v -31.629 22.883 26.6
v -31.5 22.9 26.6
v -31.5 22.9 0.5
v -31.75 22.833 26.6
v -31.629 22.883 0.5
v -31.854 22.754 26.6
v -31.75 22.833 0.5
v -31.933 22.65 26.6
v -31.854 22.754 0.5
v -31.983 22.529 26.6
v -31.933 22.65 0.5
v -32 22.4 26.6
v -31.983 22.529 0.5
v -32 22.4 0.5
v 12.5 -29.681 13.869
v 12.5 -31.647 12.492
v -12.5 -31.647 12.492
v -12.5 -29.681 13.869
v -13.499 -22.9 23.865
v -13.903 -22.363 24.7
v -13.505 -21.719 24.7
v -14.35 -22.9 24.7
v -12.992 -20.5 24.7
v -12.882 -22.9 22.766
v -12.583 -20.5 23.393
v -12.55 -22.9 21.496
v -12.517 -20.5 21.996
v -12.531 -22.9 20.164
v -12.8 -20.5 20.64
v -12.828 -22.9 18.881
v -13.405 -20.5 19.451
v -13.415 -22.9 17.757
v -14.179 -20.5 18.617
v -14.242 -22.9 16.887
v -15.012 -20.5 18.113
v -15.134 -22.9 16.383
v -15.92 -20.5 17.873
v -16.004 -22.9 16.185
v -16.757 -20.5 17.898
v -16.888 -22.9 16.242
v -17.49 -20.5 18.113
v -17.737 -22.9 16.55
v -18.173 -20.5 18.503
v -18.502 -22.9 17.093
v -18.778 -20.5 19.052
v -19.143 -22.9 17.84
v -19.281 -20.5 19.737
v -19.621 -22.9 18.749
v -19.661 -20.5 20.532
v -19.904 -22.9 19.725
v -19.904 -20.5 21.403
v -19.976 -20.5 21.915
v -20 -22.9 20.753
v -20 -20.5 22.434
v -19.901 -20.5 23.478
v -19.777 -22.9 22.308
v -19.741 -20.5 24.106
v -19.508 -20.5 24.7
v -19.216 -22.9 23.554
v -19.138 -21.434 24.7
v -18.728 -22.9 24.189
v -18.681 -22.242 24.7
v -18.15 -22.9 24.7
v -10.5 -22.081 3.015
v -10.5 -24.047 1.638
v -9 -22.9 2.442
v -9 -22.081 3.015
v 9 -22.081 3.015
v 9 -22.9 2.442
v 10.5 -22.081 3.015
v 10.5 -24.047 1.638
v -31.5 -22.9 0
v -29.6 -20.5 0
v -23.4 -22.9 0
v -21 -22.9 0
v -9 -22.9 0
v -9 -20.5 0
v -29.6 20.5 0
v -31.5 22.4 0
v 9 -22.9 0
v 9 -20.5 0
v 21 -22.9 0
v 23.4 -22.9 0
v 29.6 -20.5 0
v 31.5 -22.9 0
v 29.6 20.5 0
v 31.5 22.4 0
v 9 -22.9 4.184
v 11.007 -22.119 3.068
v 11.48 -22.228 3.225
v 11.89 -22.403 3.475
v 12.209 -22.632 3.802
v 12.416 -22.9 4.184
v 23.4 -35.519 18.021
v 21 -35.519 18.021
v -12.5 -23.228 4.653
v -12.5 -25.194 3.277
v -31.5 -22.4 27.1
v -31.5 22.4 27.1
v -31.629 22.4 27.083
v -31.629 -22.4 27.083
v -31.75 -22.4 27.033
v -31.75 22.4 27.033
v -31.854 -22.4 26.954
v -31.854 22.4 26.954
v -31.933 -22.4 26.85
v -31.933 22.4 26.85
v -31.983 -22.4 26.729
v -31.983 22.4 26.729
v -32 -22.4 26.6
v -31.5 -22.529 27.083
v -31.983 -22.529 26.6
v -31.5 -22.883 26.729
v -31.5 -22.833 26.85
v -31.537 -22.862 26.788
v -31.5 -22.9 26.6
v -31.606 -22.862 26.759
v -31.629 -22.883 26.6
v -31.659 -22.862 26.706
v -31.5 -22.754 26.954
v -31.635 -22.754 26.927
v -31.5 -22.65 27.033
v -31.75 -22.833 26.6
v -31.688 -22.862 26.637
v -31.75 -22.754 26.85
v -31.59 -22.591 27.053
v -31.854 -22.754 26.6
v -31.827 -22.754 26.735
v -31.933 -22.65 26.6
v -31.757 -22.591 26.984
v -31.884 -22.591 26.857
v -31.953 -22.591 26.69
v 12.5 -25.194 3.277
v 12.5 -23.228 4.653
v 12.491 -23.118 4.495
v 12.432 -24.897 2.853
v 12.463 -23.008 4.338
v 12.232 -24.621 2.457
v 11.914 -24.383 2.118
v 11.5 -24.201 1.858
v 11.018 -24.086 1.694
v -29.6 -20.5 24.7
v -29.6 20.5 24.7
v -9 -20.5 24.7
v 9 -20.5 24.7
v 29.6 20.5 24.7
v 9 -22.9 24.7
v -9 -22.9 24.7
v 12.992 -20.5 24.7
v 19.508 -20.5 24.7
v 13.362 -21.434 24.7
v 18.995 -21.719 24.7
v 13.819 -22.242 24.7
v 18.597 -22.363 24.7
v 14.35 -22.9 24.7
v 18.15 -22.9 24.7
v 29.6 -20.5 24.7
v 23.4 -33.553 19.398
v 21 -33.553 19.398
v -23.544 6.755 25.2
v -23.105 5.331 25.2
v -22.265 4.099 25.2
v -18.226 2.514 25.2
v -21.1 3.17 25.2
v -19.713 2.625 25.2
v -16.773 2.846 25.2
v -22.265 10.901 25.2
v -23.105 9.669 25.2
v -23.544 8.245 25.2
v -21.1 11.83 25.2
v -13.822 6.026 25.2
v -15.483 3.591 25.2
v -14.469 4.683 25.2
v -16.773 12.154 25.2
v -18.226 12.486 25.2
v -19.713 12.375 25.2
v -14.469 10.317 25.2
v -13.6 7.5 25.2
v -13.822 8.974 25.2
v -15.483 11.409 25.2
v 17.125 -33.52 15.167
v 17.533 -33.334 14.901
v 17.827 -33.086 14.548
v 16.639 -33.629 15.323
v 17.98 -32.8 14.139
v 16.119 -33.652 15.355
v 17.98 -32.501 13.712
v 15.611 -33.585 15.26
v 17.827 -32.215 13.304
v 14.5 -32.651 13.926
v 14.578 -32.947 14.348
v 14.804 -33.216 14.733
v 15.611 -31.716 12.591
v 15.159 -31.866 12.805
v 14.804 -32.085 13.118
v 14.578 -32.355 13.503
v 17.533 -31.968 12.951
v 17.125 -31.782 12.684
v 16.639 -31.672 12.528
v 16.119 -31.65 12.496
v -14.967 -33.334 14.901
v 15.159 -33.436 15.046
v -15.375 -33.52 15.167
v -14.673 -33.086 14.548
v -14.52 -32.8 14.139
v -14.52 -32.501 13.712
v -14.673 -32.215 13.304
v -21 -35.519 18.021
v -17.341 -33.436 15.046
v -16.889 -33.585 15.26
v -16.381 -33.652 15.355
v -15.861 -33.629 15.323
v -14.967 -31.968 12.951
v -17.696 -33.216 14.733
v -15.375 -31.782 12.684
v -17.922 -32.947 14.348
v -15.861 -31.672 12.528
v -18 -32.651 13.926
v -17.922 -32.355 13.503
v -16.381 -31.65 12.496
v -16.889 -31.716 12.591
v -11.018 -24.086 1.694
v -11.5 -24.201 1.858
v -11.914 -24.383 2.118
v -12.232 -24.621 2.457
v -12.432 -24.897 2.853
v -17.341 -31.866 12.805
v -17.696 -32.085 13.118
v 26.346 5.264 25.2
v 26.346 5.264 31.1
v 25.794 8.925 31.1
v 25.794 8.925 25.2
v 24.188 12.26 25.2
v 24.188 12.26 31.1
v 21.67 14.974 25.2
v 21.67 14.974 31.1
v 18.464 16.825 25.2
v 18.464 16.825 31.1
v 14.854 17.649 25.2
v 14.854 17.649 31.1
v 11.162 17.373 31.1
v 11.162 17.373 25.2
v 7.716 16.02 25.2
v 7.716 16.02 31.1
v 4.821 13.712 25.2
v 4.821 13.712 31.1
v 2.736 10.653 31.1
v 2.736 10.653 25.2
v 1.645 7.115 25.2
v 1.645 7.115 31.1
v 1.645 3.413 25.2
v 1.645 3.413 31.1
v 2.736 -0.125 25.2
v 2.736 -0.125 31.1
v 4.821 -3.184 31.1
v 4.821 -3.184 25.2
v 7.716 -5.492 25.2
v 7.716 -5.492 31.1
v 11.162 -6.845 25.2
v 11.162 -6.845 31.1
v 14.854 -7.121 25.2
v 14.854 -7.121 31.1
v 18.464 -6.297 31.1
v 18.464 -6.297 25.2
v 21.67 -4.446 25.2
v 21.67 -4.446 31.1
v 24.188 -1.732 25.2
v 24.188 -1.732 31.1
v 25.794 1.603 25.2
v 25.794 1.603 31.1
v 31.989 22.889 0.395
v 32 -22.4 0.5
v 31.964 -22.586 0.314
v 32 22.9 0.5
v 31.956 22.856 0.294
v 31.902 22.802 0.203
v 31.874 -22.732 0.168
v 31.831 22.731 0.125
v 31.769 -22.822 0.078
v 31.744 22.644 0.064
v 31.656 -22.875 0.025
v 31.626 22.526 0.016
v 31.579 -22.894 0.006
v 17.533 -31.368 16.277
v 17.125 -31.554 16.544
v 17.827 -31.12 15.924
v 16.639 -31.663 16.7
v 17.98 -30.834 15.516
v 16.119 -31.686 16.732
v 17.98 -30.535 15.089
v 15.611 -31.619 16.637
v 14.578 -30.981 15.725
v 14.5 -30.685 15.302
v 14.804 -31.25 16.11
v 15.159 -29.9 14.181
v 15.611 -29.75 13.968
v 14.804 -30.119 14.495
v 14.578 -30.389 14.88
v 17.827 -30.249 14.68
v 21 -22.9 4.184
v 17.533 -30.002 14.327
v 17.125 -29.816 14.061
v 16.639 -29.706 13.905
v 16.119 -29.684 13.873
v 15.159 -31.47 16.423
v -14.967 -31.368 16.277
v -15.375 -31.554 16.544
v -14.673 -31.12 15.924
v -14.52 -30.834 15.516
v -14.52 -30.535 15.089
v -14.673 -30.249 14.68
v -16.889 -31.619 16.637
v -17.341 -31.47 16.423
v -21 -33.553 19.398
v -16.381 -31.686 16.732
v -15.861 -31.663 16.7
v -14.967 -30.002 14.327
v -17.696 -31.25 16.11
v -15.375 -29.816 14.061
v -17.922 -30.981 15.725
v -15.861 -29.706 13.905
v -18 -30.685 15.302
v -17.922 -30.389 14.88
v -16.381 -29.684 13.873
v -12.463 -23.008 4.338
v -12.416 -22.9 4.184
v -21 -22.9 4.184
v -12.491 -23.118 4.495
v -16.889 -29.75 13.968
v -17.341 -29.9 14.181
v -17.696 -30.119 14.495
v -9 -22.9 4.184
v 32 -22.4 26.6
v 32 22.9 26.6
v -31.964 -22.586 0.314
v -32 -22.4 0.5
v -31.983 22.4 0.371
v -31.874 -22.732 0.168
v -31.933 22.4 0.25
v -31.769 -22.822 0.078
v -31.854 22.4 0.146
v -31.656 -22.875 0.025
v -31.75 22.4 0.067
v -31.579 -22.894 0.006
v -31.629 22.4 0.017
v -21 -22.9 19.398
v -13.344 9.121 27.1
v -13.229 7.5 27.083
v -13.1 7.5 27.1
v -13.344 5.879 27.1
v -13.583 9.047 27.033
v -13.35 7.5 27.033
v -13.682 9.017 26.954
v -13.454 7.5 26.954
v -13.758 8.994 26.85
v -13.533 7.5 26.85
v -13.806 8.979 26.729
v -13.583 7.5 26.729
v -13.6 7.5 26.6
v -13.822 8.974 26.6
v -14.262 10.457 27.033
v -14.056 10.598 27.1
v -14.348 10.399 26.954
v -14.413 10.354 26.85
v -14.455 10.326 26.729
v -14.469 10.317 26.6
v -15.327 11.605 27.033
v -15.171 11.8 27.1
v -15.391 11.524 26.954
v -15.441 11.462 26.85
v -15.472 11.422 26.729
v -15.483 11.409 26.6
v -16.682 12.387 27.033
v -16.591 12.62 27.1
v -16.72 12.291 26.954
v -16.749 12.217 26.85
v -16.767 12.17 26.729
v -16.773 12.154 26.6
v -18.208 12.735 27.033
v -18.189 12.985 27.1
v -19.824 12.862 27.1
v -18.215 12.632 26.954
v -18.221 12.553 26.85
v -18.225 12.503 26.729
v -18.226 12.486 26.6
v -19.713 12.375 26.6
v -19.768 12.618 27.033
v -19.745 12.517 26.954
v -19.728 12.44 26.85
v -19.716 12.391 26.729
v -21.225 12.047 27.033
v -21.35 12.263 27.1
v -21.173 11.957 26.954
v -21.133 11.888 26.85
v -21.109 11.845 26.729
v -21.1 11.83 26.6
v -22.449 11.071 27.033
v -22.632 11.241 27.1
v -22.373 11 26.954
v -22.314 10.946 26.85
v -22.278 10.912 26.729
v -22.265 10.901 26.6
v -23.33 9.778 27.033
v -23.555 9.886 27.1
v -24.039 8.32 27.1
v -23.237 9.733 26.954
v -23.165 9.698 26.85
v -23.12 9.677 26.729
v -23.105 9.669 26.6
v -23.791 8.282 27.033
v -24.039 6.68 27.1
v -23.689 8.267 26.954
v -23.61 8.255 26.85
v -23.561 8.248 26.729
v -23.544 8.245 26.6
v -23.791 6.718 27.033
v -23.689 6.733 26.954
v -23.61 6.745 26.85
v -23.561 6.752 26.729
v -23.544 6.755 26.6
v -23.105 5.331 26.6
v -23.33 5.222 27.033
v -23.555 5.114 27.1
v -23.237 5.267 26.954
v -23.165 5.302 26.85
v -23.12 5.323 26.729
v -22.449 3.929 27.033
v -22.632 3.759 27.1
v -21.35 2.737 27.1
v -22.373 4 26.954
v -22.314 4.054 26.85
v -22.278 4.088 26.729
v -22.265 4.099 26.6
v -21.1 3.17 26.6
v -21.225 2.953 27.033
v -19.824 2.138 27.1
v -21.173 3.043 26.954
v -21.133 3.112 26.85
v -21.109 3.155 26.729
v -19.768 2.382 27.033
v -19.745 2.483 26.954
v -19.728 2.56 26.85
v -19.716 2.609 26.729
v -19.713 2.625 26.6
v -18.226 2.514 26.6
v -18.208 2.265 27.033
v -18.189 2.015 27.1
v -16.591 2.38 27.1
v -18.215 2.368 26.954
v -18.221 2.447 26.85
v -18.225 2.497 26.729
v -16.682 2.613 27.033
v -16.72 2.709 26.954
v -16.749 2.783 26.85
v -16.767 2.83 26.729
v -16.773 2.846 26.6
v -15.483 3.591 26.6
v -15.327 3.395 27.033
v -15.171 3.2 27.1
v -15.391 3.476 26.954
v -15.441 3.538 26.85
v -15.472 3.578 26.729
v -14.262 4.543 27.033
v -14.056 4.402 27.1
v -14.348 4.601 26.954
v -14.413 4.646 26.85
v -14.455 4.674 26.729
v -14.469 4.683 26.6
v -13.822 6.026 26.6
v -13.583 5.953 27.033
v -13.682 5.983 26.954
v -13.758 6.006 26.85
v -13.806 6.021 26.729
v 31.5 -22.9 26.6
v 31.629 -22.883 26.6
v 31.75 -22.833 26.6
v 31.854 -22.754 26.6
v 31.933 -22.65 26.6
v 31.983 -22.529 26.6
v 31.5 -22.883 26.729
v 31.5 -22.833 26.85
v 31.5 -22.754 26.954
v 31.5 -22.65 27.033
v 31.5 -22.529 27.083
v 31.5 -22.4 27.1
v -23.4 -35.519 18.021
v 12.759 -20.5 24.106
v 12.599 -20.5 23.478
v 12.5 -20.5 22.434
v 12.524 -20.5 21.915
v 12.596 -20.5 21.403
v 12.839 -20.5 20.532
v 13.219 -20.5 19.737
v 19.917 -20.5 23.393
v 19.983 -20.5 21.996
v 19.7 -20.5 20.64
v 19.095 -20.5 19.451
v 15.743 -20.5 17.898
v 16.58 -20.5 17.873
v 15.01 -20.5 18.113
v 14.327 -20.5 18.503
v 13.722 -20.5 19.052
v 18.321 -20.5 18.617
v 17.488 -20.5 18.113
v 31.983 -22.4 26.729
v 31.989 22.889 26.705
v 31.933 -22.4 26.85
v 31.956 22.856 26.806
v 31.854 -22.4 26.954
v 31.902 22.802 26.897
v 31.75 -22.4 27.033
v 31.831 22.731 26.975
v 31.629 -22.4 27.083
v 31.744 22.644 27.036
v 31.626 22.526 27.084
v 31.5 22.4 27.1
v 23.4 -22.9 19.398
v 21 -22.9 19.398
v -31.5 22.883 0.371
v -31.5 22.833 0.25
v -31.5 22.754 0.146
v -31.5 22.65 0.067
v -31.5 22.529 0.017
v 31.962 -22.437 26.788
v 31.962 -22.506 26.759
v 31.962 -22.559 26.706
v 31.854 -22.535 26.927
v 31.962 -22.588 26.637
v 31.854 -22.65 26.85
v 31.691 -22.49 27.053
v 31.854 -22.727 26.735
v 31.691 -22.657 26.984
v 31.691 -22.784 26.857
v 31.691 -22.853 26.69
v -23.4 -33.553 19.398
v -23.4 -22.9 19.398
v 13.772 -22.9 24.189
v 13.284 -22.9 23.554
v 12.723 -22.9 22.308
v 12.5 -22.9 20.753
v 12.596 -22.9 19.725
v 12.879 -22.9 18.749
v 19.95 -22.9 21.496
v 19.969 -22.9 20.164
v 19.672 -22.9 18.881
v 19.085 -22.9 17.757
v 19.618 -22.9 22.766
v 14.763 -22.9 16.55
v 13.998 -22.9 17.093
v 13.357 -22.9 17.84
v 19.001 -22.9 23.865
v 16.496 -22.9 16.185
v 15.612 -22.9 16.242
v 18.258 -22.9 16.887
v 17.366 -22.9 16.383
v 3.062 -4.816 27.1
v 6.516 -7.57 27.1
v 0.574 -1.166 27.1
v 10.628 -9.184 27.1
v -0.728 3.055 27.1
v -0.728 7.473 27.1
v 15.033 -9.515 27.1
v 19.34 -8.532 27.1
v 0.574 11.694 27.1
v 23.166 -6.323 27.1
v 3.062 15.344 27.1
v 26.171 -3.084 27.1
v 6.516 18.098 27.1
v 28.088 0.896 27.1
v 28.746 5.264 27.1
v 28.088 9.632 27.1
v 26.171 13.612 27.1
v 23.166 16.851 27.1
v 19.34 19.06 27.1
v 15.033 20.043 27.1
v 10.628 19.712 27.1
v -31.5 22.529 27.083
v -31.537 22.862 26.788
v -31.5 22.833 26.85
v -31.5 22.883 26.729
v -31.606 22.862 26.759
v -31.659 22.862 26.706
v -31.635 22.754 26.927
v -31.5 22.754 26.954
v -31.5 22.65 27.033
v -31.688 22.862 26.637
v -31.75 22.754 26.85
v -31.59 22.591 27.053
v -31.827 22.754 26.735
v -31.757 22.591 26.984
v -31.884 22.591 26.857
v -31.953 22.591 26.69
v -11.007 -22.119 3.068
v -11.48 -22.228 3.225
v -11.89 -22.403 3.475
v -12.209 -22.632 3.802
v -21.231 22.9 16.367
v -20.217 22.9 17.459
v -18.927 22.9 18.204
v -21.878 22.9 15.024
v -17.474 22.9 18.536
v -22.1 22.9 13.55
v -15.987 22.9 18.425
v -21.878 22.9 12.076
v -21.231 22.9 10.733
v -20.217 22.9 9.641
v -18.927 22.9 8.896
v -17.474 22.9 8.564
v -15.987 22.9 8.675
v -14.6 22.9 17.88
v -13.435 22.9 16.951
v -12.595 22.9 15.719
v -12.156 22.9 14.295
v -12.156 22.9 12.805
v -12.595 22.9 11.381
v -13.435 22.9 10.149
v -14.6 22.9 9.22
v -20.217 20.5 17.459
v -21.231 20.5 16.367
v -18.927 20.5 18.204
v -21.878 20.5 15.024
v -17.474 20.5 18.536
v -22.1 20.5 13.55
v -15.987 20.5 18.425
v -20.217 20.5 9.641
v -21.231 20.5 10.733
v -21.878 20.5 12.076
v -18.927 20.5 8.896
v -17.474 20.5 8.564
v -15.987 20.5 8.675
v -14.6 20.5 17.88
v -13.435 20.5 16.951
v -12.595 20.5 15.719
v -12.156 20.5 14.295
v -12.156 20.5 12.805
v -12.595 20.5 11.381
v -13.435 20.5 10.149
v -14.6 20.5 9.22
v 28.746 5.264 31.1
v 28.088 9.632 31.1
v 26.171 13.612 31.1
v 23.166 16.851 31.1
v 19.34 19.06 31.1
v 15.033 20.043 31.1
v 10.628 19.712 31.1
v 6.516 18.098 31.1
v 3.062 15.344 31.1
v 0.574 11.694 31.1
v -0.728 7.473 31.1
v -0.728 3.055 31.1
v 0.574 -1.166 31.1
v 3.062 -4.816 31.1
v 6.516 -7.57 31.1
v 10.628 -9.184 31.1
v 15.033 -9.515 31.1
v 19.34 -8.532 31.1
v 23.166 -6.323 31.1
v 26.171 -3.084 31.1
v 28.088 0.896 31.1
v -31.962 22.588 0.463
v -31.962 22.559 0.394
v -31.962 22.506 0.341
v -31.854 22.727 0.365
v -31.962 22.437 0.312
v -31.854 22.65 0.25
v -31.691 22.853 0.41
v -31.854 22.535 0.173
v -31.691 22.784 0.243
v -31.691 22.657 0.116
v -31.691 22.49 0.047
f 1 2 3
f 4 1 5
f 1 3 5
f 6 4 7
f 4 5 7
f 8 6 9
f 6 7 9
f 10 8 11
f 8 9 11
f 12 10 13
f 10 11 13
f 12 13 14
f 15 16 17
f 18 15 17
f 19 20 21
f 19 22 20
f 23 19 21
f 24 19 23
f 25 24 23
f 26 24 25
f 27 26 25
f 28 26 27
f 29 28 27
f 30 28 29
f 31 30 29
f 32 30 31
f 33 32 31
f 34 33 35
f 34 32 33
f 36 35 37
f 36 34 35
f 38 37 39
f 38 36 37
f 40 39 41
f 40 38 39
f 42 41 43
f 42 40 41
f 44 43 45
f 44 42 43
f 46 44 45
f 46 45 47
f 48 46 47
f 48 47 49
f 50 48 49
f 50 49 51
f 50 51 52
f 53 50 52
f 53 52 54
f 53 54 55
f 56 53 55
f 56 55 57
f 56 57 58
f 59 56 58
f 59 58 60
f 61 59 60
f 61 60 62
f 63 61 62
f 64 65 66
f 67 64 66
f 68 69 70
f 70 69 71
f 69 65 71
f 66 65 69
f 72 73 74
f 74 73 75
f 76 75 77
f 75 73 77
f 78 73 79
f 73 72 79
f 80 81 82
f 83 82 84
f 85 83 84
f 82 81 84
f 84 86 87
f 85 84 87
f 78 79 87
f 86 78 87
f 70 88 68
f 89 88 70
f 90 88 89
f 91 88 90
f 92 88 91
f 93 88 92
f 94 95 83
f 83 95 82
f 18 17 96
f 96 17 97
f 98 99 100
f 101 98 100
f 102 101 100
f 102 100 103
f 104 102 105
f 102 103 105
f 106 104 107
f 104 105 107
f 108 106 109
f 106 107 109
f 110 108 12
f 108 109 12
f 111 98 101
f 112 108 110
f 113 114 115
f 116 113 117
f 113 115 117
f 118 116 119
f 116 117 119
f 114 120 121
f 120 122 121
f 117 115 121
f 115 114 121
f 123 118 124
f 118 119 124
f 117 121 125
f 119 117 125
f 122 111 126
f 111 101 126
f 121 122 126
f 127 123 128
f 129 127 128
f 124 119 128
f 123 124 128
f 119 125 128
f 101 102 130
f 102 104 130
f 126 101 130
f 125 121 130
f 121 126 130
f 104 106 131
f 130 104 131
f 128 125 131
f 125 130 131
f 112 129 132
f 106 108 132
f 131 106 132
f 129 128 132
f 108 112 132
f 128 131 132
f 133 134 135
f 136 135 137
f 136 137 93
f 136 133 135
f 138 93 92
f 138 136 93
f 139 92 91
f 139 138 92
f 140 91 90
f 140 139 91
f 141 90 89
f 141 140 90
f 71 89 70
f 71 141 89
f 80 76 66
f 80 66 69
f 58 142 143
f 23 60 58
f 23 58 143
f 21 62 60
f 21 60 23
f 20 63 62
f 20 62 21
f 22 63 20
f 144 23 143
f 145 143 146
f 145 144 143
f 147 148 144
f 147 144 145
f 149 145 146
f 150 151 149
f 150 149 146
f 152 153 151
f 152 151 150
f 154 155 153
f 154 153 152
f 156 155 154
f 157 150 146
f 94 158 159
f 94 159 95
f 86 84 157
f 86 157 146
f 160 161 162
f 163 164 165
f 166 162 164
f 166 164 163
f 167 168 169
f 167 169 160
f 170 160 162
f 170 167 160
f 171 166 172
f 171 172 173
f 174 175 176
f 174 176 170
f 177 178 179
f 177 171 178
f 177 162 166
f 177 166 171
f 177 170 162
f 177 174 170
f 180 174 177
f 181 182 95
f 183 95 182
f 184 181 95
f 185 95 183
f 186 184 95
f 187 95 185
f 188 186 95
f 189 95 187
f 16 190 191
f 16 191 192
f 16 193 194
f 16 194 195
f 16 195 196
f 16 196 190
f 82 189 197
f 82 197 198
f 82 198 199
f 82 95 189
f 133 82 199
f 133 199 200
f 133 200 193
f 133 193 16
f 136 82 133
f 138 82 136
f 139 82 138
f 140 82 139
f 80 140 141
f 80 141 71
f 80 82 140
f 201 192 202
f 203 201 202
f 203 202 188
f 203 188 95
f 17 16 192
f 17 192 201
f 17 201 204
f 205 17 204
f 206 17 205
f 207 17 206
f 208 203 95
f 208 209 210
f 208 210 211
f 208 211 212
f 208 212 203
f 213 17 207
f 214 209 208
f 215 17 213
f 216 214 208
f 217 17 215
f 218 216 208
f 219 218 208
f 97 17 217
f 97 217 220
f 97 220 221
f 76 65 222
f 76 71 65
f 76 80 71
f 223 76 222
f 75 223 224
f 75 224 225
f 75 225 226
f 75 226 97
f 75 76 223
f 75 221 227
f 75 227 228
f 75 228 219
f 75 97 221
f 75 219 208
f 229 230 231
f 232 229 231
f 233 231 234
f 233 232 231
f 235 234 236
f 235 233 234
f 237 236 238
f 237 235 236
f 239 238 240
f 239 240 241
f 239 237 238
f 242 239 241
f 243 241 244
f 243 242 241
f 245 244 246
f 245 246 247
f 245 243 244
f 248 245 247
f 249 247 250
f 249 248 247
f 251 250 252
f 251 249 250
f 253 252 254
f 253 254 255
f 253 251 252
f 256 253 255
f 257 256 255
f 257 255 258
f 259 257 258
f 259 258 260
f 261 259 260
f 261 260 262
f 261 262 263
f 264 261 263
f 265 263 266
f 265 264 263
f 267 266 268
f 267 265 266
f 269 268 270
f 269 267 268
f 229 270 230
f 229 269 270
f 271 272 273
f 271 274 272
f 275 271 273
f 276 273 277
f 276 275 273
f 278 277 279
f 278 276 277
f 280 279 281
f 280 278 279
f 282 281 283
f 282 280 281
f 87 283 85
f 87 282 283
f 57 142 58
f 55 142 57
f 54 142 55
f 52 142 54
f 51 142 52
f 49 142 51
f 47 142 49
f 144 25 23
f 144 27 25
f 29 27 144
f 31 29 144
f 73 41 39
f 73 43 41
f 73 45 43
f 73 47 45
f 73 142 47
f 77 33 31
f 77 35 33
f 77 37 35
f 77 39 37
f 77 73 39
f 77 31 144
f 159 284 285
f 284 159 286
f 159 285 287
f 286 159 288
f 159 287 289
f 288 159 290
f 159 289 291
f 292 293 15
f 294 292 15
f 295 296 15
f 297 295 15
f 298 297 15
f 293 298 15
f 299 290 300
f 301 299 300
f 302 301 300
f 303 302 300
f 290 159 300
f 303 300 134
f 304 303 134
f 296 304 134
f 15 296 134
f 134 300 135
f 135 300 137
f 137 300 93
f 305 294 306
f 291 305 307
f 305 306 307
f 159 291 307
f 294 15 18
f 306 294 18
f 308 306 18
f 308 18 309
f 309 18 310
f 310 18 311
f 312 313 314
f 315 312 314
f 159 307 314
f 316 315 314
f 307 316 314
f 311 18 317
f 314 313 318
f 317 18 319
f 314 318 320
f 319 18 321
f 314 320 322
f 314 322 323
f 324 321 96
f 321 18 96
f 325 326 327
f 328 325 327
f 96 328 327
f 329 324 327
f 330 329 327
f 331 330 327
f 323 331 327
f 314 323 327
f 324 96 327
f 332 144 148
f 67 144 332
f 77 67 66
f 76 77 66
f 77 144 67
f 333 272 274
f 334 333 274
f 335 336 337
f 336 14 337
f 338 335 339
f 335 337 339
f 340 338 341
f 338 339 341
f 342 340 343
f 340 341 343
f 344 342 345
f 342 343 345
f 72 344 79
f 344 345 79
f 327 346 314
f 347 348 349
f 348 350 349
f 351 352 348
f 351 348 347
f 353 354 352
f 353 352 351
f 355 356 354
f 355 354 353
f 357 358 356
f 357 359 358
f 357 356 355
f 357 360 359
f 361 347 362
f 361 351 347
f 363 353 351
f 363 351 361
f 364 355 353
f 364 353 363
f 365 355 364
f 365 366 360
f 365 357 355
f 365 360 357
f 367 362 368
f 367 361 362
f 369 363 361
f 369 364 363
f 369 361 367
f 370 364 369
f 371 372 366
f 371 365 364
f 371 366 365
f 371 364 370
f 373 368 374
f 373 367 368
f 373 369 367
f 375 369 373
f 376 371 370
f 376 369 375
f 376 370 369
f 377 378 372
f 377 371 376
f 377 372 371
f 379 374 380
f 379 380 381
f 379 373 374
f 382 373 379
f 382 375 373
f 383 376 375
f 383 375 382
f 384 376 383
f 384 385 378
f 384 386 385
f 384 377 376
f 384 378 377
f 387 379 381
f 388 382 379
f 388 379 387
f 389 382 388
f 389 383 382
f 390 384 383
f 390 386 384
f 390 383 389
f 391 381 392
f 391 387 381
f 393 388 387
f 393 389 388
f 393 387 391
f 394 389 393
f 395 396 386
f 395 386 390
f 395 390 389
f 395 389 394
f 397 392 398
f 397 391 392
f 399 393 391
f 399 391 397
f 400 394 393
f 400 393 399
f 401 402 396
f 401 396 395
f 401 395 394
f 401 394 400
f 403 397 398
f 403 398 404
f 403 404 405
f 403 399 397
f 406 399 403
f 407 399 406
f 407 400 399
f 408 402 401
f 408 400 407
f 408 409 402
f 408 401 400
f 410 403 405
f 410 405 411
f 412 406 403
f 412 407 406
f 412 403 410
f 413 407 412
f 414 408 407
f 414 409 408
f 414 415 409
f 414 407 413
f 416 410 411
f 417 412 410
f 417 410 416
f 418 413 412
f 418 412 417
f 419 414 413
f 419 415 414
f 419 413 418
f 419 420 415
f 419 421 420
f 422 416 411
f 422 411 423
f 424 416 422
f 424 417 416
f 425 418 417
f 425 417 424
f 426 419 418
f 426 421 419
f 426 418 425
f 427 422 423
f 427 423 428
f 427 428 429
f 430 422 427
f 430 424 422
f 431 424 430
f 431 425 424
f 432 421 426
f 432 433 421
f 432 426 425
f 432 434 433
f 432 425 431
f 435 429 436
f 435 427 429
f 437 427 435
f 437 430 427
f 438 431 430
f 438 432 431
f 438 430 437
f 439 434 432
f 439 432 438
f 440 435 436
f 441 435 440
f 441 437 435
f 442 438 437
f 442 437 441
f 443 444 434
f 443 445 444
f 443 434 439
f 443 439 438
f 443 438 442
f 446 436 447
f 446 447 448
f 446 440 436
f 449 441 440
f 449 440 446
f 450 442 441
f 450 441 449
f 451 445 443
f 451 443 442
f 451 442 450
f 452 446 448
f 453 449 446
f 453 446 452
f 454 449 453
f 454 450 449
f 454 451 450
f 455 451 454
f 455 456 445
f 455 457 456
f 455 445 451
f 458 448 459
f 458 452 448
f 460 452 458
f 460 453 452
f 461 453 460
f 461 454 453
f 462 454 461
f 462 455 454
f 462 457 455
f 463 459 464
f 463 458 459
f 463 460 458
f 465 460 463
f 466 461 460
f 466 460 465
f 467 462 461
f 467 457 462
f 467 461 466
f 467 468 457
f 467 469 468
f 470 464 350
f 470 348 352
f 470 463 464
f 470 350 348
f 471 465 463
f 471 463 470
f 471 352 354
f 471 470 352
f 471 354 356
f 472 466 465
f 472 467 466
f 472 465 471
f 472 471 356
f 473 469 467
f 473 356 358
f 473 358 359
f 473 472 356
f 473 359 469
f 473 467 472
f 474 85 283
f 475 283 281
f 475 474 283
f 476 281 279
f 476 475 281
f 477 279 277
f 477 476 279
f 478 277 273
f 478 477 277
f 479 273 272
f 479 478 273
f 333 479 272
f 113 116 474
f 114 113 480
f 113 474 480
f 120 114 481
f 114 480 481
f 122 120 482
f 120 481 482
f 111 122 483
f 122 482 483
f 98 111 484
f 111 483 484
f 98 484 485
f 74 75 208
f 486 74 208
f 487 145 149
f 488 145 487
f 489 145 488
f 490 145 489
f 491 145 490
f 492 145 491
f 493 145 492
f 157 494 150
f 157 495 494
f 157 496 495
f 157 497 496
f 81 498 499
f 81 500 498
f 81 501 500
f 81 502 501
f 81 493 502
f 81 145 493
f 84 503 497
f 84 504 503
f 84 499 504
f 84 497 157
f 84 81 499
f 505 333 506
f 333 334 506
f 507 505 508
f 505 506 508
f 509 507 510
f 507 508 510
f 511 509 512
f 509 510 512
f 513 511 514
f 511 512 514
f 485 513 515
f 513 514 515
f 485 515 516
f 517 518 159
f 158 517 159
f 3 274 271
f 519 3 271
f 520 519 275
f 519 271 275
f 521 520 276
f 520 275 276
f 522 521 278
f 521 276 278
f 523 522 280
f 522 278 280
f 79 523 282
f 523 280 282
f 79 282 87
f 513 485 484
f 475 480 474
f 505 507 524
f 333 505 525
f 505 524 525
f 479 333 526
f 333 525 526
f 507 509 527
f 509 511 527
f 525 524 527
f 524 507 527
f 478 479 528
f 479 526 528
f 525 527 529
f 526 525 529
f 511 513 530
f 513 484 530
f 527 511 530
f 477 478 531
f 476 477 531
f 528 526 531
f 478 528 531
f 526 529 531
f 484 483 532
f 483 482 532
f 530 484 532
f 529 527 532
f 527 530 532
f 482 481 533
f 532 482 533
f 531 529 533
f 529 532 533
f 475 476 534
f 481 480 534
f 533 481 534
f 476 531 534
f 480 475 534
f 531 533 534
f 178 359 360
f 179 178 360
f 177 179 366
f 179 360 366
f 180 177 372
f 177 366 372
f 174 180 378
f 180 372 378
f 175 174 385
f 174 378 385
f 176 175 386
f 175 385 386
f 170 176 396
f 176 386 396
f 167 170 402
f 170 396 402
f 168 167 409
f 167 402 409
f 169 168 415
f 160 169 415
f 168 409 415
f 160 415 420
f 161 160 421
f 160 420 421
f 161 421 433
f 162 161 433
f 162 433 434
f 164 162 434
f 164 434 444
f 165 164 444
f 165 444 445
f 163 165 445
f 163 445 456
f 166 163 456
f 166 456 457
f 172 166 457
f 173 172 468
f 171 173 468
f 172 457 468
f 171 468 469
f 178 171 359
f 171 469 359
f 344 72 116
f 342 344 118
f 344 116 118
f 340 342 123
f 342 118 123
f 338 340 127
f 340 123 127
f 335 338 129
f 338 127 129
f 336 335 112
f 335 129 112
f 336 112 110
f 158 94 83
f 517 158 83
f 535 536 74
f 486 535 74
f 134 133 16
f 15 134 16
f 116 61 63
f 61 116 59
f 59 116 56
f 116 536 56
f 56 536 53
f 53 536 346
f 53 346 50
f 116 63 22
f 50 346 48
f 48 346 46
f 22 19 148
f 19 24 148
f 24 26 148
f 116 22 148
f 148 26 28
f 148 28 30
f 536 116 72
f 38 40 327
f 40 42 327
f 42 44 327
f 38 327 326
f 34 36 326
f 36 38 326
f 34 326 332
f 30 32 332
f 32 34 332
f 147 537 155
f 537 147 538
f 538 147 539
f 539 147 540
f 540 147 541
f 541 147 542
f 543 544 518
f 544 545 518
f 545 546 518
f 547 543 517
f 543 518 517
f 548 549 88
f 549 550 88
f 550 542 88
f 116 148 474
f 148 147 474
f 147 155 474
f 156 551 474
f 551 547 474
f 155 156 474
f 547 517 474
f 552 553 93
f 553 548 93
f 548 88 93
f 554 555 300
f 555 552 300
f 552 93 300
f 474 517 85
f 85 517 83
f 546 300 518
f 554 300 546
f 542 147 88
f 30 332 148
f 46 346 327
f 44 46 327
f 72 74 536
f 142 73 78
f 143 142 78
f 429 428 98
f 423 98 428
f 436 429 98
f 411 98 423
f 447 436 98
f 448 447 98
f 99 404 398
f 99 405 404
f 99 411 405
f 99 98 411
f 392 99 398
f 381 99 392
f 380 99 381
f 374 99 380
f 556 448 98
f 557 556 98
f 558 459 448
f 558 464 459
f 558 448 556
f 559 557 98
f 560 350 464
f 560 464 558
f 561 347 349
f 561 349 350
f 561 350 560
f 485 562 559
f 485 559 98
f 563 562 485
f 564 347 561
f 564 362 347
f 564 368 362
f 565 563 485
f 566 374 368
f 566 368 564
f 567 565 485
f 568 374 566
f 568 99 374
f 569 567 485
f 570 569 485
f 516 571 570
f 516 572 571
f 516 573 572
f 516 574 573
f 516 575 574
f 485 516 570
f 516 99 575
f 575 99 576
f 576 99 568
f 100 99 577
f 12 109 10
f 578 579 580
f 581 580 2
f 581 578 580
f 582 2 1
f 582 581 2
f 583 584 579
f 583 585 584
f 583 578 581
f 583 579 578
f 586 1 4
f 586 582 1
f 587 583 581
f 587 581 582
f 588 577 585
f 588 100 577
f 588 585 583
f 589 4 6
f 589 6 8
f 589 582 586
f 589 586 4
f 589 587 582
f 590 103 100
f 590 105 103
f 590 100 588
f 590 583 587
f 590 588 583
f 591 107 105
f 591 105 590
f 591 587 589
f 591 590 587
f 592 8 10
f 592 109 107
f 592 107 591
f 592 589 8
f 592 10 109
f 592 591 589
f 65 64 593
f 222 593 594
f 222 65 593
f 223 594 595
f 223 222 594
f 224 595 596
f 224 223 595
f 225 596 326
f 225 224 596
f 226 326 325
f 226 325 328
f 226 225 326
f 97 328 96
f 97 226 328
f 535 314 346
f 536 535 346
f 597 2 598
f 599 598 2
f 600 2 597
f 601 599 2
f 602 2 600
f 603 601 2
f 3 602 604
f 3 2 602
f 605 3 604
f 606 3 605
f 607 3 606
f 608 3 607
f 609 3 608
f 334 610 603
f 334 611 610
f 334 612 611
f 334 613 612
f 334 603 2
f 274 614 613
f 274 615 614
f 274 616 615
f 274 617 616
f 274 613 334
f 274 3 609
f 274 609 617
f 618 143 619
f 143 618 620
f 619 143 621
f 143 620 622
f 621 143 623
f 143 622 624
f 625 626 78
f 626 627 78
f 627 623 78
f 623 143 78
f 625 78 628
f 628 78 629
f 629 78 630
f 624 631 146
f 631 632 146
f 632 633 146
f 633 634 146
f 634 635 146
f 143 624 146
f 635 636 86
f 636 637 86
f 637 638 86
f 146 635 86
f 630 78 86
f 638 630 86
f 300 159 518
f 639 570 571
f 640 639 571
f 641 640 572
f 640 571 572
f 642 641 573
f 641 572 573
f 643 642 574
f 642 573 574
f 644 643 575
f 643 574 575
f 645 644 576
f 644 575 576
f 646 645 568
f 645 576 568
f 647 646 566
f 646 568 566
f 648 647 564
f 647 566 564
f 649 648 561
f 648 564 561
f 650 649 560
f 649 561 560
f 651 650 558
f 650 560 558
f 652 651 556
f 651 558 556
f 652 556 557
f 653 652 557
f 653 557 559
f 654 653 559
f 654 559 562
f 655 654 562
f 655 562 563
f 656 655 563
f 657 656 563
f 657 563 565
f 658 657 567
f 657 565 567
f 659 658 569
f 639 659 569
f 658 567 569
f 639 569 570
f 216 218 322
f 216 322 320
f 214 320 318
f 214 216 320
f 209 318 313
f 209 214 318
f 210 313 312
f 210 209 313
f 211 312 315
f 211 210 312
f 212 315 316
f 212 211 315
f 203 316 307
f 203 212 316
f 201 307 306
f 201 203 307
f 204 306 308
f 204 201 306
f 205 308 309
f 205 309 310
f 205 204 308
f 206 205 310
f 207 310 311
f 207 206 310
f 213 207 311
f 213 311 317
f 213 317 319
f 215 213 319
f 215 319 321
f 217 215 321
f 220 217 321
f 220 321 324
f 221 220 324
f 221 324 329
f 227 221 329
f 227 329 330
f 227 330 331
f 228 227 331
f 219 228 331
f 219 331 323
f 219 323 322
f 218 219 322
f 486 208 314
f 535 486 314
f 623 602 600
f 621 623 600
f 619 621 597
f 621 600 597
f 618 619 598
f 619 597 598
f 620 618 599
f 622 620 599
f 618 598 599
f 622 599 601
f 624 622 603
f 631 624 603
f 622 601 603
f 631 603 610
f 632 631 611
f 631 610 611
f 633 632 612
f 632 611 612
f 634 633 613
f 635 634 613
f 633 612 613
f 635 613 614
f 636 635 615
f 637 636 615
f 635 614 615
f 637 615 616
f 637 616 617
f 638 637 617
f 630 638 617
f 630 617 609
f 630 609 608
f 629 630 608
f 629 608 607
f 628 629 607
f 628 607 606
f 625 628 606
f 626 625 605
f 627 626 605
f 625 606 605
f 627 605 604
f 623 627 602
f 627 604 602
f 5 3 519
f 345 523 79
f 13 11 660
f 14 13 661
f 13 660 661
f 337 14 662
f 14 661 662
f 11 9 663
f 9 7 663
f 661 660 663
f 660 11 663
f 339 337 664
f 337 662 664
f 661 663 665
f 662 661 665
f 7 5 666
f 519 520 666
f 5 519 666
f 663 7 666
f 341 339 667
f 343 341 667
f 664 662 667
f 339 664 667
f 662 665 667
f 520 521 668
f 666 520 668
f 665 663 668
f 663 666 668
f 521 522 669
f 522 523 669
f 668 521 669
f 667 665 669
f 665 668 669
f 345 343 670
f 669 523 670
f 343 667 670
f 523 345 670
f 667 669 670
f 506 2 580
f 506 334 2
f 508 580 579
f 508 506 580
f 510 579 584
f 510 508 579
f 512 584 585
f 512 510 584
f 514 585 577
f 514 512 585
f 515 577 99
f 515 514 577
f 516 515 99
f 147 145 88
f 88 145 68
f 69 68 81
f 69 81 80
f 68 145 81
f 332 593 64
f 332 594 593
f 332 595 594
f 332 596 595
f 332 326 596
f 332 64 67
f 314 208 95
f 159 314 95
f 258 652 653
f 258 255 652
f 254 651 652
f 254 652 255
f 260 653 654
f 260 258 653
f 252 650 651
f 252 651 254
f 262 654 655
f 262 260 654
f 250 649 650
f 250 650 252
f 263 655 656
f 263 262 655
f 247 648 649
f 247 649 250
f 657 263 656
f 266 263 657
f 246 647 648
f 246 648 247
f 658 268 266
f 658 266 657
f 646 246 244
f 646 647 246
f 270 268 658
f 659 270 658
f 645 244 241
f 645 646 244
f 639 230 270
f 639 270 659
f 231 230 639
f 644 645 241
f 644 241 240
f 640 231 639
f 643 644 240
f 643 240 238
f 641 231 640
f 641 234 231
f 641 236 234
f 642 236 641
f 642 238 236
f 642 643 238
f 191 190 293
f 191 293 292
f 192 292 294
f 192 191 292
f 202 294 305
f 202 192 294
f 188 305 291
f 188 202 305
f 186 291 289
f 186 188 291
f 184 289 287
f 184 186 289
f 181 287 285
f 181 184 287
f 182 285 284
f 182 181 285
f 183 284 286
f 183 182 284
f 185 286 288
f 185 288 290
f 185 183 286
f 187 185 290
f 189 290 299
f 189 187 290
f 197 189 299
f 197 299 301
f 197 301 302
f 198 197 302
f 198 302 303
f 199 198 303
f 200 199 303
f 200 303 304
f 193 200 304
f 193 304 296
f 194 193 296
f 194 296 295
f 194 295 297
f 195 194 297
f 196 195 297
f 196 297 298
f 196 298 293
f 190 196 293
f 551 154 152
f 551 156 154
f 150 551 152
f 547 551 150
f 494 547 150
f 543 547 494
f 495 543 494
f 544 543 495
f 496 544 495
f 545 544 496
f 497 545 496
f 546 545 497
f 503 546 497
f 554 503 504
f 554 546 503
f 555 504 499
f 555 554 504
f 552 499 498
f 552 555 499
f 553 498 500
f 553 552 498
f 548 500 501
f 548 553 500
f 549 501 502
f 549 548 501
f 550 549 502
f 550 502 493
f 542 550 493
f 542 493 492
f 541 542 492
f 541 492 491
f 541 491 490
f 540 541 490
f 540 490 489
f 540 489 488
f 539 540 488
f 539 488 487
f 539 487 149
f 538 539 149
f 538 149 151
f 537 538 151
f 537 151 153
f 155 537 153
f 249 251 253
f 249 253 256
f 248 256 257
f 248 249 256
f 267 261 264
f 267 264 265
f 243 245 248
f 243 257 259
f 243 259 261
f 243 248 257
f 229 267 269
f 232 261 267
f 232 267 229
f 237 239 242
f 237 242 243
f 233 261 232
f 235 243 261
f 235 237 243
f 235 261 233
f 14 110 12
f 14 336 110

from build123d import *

# Parameters (mm, degrees)
F5_W         = 64
F5_H         = 45.8
F5_W_2       = 59.2
F5_H_2       = 41
F6_DEPTH     = 24.7
F7_W         = 64
F7_H         = 45.8
F7_W_2       = 59.2
F7_H_2       = 41
F8_DEPTH     = 2.4
F9_R         = 5
F10_DEPTH    = 1.9
F11_R        = 14.82
F11_R_2      = 12.42
F12_DEPTH    = 4
F13_DEPTH    = 1.9
F14_R        = 5
F15_DEPTH    = 2.4
F17_R        = 1.75
F18_DEPTH    = 2.4
F20_DEPTH    = 2.4
F22_DEPTH    = 2.4
F23_R        = 1.75
F24_REACH    = 60.3061382673
F25_R        = 0.5
F26_W        = 18
F26_H        = 2.4
F27_DEPTH    = 24.7
F28_R        = 3.75
F29_REACH    = 63.5629925168
F31_DEPTH    = 2.4
F32_T1_DEPTH = 2.4


# Not quite as in the source:
# - a fillet or chamfer that OpenCascade refuses, or shapes differently, is made with other operations: its cross-section is extruded or revolved along the edge and cut away or added
# - a feature names something its author has since deleted; it is built from what else it names


with BuildPart() as f6:
    # F5 (on Top) → F6 (new body)
    with BuildSketch(Plane.XY):
        Rectangle(F5_W, F5_H)
        Rectangle(F5_W_2, F5_H_2, mode=Mode.SUBTRACT)
    extrude(amount=F6_DEPTH)

    # F7 (on face) → F8 (join)
    with BuildSketch(Plane.XY.offset(24.7)):
        Rectangle(F7_W, F7_H)
        Rectangle(F7_W_2, F7_H_2, mode=Mode.SUBTRACT)
        Rectangle(F7_W_2, F7_H_2)
    extrude(amount=F8_DEPTH)

    # F9 (on face) → F10 (cut)
    with BuildSketch(Plane.XY.offset(27.1)):
        with Locations((-18.6, 7.5)):
            Circle(F9_R)
    extrude(amount=-F10_DEPTH, mode=Mode.SUBTRACT)

    # F11 (on face) → F12 (join)
    with BuildSketch(Plane.XY.offset(27.1)):
        with Locations((13.926, 5.264)):
            Circle(F11_R)
        with Locations((13.926, 5.264)):
            Circle(F11_R_2, mode=Mode.SUBTRACT)
    extrude(amount=F12_DEPTH)

    # F13 (cut): a face of the model
    f13_faces = [f6.faces().sort_by_distance(p)[0] for p in [
        (13.926, 5.264, 27.1),
    ]]
    extrude(f13_faces, amount=-F13_DEPTH, mode=Mode.SUBTRACT)

    # F14 (on face) → F15 (cut)
    with BuildSketch(Plane(origin=(0, 22.9, 0), x_dir=(-1, 0, 0), z_dir=(0, 1, 0))):
        with Locations((17.1, 13.55)):
            Circle(F14_R)
    extrude(amount=-F15_DEPTH, mode=Mode.SUBTRACT)

    # F17 (on face) → F18 (join)
    with BuildSketch(Plane(origin=(0, -15.3661306411, -10.759480508), x_dir=(-1, 0, 0), z_dir=(0, 0.8191520443, 0.5735764364))):
        Polygon((0, 24.1349003924), (0, 13.1349003924), (21, 13.1349003924), (21, 35.1349003924), (0, 35.1349003924), align=None)
        with Locations((16.25, 30.1349003924)):
            Circle(F17_R, mode=Mode.SUBTRACT)
        Polygon((-21, 13.1349003924), (0, 13.1349003924), (0, 24.1349003924), (0, 35.1349003924), (-21, 35.1349003924), align=None)
        with Locations((-16.25, 30.1349003924)):
            Circle(F17_R, mode=Mode.SUBTRACT)
    extrude(amount=F18_DEPTH)

    # F19 (on face) → F20 (join)
    with BuildSketch(Plane(origin=(-21, 0, 0), x_dir=(0, -1, 0), z_dir=(-1, 0, 0))):
        Polygon((22.9, 0), (35.5186815997, 18.0213449744), (33.5527166934, 19.3979284216), (22.9, 19.3979284216), align=None)
    extrude(amount=F20_DEPTH)

    # F21 (on face) → F22 (join)
    with BuildSketch(Plane.YZ.offset(21)):
        Polygon((-35.5186815997, 18.0213449744), (-22.9, 0), (-22.9, 19.3979284216), (-33.5527166934, 19.3979284216), align=None)
    extrude(amount=F22_DEPTH)

    f24_end = f6.faces().sort_by_distance((0, 0, 24.7))[0]
    # F23 (on face) → F24 (cut, up to a face of the model that its end follows)
    with BuildSketch(Plane(origin=(0, -15.3661306411, -10.759480508), x_dir=(1, 0, 0), z_dir=(0, -0.8191520443, -0.5735764364))):
        with Locations((-16.25, 30.1349003924)):
            Circle(F23_R)
        with Locations((16.25, 30.1349003924)):
            Circle(F23_R)
    f24_long = extrude(amount=-F24_REACH, mode=Mode.PRIVATE)
    add(split(f24_long, bisect_by=f24_end, keep=Keep.TOP, mode=Mode.PRIVATE), mode=Mode.SUBTRACT)

    # F25
    f25_edges = [f6.edges().sort_by_distance(p)[0] for p in [
        (-32, 0, 27.1),
        (0, -22.9, 27.1),
        (32, 0, 27.1),
        (0, 22.9, 27.1),
        (-23.6, 7.5, 27.1),
        (32, 0, 0),
        (0, 22.9, 0),
        (-32, 22.9, 13.55),
        (-32, 0, 0),
        (-32, -22.9, 13.55),
        (32, -22.9, 13.55),
    ]]
    fillet(f25_edges, radius=F25_R)

    # F26 (on face) → F27 (cut, through all)
    with BuildSketch(Plane(origin=(0, 0, 0), x_dir=(1, 0, 0), z_dir=(0, 0, -1))):
        with Locations((0, 21.7)):
            Rectangle(F26_W, F26_H)
    extrude(amount=-F27_DEPTH, mode=Mode.SUBTRACT)

    f29_end = Plane(origin=(0, -0.3794689119, 24.7), x_dir=(-1, 0, 0), z_dir=(0, 0, -1))
    # F28 (on face) → F29 (cut, up to a plane its end follows)
    with BuildSketch(Plane(origin=(0, -13.4001657348, -9.3828970608), x_dir=(-1, 0, 0), z_dir=(0, 0.8191520443, 0.5735764364))):
        with Locations((16.25, 30.1349003924)):
            Circle(F28_R)
        with Locations((-16.25, 30.1349003924)):
            Circle(F28_R)
    f29_long = extrude(amount=F29_REACH, mode=Mode.PRIVATE)
    add(split(f29_long, bisect_by=f29_end, keep=Keep.TOP, mode=Mode.PRIVATE), mode=Mode.SUBTRACT)

    # F30 (on face) → F31 (cut)
    with BuildSketch(Plane(origin=(0, -15.3661306411, -10.759480508), x_dir=(1, 0, 0), z_dir=(0, -0.8191520443, -0.5735764364))):
        Polygon((12.5, 28.3849003924), (-12.5, 28.3849003924), (-12.5, 15.1349003924), (0, 15.1349003924), (12.5, 15.1349003924), align=None)
    extrude(amount=-F31_DEPTH, mode=Mode.SUBTRACT)

    # F32: fillet of radius 2 on 2 edges, made by hand

    # F32_s2 → F32_t1 (join)
    with BuildSketch(Plane(origin=(0, -15.3661306411, -10.759480508), x_dir=(1, 0, 0), z_dir=(0, 0.8191520443, 0.5735764364))):
        with BuildLine():
            ThreePointArc((-10.5, -15.1349003924), (-11.9142135624, -15.7206868301), (-12.5, -17.1349003924))
            Line((-12.5, -17.1349003924), (-12.5, -15.1349003924))
            Line((-12.5, -15.1349003924), (-10.5, -15.1349003924))
        make_face()
        with BuildLine():
            ThreePointArc((12.5, -17.1349003924), (11.9142135624, -15.7206868301), (10.5, -15.1349003924))
            Line((10.5, -15.1349003924), (12.5, -15.1349003924))
            Line((12.5, -15.1349003924), (12.5, -17.1349003924))
        make_face()
    extrude(amount=F32_T1_DEPTH)


solid = f6.part
